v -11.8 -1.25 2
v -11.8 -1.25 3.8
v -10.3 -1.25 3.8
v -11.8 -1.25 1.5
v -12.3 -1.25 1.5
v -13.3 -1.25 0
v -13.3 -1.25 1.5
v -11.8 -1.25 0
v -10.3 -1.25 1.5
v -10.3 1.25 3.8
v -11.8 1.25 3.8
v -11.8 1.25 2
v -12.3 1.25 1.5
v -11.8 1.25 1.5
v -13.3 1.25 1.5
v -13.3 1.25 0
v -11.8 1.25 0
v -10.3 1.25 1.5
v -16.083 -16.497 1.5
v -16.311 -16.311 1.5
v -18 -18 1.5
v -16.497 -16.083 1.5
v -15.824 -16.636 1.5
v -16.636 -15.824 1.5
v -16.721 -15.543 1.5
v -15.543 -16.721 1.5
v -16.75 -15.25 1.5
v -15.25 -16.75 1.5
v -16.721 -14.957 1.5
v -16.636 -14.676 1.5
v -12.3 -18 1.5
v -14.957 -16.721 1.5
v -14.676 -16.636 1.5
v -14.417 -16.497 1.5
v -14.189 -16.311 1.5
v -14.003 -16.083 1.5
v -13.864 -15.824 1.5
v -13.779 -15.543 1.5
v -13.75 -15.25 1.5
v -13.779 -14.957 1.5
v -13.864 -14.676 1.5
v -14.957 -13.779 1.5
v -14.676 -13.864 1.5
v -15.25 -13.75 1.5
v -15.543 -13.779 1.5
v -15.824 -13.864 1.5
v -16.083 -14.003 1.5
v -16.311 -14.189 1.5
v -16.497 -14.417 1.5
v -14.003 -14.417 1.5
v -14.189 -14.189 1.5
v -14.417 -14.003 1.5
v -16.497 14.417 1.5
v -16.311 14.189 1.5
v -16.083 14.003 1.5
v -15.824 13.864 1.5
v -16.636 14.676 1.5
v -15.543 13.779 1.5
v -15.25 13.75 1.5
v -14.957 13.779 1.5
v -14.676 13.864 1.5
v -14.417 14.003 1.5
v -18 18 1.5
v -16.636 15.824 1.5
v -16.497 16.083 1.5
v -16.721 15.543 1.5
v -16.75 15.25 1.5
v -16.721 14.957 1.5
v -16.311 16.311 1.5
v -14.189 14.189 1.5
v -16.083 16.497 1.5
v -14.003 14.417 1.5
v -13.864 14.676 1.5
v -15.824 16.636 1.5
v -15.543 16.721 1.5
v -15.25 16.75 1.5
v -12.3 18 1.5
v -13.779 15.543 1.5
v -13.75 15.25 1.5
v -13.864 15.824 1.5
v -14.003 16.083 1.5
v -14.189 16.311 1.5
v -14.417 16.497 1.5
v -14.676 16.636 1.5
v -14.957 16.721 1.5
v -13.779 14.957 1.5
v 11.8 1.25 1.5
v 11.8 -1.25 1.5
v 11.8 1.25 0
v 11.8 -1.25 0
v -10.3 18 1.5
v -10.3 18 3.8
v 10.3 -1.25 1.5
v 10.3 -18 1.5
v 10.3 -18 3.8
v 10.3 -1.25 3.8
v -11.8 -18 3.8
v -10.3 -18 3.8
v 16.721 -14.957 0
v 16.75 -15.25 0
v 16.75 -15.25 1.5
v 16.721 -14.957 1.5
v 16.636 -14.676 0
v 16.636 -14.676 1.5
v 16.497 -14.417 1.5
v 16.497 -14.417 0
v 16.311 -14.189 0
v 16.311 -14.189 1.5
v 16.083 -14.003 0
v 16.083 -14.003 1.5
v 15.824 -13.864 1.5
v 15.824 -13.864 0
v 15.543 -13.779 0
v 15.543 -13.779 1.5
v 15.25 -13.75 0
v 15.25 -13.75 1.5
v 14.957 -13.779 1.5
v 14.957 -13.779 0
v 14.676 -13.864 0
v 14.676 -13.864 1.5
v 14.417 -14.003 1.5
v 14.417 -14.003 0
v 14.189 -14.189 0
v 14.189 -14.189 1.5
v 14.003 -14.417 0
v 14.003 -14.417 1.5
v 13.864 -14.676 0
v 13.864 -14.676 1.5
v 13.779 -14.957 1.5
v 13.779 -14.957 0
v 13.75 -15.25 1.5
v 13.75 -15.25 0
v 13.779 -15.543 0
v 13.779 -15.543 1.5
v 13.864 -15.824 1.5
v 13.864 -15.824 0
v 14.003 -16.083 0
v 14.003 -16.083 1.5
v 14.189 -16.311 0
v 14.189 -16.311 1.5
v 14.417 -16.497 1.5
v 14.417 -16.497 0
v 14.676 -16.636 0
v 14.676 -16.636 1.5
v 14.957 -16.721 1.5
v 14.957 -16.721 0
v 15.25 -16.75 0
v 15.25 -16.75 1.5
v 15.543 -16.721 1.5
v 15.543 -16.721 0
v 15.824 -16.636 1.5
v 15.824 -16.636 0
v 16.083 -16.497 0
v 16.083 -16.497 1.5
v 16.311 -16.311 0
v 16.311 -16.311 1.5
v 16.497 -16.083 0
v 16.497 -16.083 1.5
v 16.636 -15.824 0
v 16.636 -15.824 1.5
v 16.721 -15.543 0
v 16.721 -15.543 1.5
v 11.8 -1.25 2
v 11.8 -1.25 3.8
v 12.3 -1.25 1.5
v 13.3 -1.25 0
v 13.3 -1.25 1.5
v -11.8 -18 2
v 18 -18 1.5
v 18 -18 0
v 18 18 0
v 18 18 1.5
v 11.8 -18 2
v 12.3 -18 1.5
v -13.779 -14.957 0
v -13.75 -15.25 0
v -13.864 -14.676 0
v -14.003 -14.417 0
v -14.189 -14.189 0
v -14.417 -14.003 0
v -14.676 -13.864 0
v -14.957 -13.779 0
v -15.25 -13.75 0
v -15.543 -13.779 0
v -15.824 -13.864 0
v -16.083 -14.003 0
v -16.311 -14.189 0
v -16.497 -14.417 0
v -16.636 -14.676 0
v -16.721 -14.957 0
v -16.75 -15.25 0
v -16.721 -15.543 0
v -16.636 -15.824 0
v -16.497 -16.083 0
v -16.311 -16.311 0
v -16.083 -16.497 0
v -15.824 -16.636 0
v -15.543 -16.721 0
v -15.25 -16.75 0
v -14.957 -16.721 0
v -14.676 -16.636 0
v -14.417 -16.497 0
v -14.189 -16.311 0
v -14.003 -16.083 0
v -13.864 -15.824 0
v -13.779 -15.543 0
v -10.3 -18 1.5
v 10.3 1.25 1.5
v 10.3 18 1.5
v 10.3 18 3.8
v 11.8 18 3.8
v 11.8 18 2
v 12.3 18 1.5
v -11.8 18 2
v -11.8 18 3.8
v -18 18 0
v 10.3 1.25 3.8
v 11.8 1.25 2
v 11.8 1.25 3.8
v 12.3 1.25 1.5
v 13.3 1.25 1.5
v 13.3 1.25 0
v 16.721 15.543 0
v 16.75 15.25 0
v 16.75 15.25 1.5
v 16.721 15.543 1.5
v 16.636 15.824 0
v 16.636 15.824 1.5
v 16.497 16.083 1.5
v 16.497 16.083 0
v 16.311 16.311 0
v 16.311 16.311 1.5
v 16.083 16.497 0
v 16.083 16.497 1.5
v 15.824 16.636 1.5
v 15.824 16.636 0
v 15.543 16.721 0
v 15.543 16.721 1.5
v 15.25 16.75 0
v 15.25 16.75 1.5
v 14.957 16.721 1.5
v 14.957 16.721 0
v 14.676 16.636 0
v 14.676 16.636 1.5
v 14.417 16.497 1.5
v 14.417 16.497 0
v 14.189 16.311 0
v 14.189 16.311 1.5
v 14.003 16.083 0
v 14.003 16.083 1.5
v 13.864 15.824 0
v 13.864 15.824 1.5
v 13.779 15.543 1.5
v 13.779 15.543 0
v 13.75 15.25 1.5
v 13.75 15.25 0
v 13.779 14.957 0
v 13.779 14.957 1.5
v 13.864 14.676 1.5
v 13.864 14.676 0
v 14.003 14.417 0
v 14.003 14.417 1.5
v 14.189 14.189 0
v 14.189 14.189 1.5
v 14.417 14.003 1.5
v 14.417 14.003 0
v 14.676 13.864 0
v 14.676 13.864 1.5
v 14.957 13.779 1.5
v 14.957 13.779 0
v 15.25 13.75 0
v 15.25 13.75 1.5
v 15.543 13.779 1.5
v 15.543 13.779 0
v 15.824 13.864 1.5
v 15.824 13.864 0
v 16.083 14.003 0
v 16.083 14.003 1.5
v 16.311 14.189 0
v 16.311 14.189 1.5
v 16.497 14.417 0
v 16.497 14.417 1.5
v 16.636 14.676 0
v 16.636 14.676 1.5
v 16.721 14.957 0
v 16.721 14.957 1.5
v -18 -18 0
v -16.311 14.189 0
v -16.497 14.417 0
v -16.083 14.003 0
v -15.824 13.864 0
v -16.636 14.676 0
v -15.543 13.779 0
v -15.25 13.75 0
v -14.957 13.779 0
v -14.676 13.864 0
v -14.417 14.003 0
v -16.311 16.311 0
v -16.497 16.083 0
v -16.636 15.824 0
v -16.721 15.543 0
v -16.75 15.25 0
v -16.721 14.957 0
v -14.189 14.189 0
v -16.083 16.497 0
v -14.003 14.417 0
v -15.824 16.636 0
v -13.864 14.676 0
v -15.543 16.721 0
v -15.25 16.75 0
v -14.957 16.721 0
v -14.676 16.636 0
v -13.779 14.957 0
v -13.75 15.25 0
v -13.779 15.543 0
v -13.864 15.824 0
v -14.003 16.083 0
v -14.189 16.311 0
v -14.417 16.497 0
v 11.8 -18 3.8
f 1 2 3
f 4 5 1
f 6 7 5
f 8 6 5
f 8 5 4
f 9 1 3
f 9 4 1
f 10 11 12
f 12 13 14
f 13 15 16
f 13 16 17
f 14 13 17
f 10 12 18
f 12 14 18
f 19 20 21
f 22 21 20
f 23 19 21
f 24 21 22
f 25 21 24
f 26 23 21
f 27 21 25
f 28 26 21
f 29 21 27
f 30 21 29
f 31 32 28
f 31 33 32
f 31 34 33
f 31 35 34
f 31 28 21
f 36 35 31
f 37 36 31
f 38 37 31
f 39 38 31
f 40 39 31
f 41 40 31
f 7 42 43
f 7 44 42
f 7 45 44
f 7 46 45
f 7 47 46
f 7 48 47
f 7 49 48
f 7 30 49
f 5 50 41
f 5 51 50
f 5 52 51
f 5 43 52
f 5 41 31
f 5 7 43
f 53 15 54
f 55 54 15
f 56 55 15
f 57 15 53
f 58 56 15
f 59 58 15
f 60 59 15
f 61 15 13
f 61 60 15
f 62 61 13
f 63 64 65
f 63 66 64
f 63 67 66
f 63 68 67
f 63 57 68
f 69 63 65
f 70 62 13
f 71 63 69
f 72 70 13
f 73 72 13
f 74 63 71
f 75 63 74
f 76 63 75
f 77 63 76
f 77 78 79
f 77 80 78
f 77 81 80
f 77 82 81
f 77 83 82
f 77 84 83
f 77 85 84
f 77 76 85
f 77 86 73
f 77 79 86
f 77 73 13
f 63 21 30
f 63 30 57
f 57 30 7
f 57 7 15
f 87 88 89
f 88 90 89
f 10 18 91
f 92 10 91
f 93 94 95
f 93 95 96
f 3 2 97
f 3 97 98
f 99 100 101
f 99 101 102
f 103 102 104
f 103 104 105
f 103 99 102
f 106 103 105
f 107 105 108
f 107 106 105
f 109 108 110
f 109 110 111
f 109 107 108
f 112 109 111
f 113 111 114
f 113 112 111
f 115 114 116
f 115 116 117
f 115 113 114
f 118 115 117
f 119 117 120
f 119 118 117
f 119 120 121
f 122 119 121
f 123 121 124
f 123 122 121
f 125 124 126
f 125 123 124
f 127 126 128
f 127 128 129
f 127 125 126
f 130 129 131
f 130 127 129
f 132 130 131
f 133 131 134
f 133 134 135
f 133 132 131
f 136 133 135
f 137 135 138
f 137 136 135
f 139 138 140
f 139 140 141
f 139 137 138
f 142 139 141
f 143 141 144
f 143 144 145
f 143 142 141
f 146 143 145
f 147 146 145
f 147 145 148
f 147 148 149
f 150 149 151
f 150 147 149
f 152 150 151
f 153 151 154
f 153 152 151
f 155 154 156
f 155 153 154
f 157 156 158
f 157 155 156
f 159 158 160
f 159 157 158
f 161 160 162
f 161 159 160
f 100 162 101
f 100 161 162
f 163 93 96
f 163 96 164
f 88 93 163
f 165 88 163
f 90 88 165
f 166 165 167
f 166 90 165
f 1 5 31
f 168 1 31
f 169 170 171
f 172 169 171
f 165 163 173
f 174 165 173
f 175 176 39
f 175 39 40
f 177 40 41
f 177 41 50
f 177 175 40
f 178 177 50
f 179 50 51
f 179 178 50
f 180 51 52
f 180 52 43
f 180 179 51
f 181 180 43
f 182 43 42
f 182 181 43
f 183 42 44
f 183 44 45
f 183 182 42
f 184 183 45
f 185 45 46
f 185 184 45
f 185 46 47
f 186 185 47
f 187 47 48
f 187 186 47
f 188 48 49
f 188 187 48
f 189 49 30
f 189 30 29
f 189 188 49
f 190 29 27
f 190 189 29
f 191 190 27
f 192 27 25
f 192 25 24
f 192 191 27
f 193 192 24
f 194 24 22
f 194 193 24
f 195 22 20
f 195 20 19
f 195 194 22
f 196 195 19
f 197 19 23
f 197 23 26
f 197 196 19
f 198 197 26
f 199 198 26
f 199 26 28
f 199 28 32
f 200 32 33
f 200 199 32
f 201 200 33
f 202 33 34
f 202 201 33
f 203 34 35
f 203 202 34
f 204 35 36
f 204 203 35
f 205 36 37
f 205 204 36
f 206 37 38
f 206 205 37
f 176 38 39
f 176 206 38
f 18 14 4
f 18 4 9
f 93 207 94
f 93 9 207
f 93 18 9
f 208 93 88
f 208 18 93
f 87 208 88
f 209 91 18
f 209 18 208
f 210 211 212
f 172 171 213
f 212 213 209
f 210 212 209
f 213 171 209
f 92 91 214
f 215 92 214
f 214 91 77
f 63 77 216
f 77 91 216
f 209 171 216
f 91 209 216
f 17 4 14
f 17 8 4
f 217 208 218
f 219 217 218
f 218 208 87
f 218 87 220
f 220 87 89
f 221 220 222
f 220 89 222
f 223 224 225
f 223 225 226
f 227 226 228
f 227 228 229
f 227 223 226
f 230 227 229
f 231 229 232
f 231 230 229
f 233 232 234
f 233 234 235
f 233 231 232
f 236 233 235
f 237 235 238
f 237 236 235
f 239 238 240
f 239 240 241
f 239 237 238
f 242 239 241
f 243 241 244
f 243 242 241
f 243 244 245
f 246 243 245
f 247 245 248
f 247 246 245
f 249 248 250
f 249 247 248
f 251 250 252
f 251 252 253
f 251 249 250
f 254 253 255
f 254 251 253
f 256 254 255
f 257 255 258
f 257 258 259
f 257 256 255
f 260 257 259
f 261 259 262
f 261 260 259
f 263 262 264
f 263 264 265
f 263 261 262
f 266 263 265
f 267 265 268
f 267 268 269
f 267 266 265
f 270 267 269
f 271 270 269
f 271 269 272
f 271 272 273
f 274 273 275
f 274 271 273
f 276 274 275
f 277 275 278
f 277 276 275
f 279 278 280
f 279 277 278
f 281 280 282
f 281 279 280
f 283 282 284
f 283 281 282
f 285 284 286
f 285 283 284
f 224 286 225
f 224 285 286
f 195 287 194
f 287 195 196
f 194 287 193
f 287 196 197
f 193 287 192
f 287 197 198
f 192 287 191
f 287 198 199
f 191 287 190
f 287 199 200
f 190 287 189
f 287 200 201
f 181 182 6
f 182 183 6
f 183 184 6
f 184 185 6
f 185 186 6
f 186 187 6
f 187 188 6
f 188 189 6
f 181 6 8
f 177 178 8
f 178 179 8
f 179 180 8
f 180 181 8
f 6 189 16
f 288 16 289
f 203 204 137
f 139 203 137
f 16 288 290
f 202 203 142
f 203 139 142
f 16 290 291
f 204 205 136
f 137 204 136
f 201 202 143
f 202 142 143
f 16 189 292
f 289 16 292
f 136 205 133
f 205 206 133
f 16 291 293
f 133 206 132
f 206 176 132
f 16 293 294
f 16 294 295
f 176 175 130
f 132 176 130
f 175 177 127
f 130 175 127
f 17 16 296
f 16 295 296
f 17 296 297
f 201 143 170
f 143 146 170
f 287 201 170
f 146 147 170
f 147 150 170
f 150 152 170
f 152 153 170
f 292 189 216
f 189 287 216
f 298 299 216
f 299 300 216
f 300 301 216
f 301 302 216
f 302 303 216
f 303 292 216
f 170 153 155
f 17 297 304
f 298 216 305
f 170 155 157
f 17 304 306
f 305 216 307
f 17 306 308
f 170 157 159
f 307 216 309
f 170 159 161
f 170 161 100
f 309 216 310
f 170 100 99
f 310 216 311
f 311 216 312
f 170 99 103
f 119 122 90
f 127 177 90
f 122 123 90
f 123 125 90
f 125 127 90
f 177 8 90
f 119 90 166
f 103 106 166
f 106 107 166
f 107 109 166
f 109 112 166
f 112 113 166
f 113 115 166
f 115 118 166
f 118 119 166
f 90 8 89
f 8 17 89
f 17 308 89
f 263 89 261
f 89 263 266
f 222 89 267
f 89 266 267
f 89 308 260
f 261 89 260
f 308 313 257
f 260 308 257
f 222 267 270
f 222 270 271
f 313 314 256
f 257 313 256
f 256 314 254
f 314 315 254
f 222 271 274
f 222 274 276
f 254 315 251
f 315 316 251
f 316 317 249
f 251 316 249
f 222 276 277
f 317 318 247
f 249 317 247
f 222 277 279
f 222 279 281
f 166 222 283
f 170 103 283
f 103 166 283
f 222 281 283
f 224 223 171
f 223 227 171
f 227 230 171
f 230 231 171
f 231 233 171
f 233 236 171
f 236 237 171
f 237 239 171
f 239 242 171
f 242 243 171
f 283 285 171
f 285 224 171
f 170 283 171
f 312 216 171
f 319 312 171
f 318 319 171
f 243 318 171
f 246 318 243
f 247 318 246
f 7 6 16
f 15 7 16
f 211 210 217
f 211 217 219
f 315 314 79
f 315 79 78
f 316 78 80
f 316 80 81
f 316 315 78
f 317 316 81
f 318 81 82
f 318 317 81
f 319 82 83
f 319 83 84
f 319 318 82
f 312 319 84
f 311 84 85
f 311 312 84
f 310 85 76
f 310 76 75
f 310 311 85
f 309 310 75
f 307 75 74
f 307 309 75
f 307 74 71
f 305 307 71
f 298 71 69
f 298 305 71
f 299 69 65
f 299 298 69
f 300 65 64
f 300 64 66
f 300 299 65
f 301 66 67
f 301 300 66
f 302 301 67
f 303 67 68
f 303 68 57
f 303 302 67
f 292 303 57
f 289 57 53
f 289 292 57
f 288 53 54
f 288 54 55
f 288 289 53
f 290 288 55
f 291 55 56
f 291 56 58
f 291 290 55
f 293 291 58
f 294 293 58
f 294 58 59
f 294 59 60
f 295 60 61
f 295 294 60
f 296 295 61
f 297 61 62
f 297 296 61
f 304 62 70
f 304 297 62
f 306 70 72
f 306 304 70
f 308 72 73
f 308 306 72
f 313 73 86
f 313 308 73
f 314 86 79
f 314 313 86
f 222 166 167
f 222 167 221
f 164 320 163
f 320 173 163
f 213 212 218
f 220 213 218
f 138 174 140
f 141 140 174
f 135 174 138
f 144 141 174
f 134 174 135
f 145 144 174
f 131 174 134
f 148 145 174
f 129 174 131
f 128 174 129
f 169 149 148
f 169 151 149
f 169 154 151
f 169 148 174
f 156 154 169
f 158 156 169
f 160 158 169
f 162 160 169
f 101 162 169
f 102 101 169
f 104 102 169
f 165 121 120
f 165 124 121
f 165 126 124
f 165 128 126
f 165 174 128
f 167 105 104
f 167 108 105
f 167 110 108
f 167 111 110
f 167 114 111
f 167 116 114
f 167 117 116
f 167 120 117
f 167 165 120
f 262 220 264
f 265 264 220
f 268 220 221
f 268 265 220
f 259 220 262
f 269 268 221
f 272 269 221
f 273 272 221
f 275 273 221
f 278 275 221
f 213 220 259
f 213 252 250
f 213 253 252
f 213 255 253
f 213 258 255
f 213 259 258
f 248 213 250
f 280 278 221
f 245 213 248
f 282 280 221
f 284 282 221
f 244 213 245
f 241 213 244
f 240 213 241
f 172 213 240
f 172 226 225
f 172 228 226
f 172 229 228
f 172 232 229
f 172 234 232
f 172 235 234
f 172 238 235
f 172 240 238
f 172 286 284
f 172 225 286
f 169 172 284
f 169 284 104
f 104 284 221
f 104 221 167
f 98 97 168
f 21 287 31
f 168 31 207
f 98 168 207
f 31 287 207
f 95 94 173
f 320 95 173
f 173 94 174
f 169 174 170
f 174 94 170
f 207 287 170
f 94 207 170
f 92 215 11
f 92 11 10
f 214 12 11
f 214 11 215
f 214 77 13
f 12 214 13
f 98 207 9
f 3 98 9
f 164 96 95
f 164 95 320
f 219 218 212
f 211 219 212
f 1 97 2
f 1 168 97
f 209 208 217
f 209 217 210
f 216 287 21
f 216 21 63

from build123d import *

# Parameters (mm, degrees)
F0_W     = 6.2
F0_H     = 36
F0_R     = 1.5
F0_W_2   = 1.5
F0_W_3   = 20.6
F3_DEPTH = 1.5
F4_DEPTH = 3.8
F2_W     = 1.5
F2_H     = 2.5
F5_DEPTH = 25
F6_SIZE  = 0.5
F7_W     = 1.5
F7_H     = 2.5
F8_DEPTH = 25


with BuildPart() as f3:
    # F0 (on Top) → F3 (new body)
    with BuildSketch(Plane.XY):
        with Locations((14.9, 0)):
            Rectangle(F0_W, F0_H)
        with Locations((15.25, -15.25)):
            Circle(F0_R, mode=Mode.SUBTRACT)
        with Locations((15.25, 15.25)):
            Circle(F0_R, mode=Mode.SUBTRACT)
        with Locations((11.05, 0)):
            Rectangle(F0_W_2, F0_H)
        Rectangle(F0_W_3, F0_H)
        with Locations((-11.05, 0)):
            Rectangle(F0_W_2, F0_H)
        with Locations((-14.9, 0)):
            Rectangle(F0_W, F0_H)
        with Locations((-15.25, -15.25)):
            Circle(F0_R, mode=Mode.SUBTRACT)
        with Locations((-15.25, 15.25)):
            Circle(F0_R, mode=Mode.SUBTRACT)
    extrude(amount=F3_DEPTH)

    # F0 (on Top) → F4 (join)
    with BuildSketch(Plane.XY):
        with Locations((-11.05, 0)):
            Rectangle(F0_W_2, F0_H)
        with Locations((11.05, 0)):
            Rectangle(F0_W_2, F0_H)
    extrude(amount=F4_DEPTH)

    # F2 (on face) → F5 (cut)
    with BuildSketch(Plane.XY):
        with Locations((-12.55, 0)):
            Rectangle(F2_W, F2_H)
        with Locations((12.55, 0)):
            Rectangle(F2_W, F2_H)
    extrude(amount=F5_DEPTH, mode=Mode.SUBTRACT)

    # F6
    f6_edges = [f3.edges().sort_by_distance(p)[0] for p in [
        (-11.8, 9.625, 1.5),
        (-11.8, -9.625, 1.5),
        (11.8, -9.625, 1.5),
        (11.8, 9.625, 1.5),
    ]]
    chamfer(f6_edges, length=F6_SIZE)

    # F7 (on face) → F8 (cut)
    with BuildSketch(Plane.XY.offset(1.5)):
        with Locations((-11.05, 0)):
            Rectangle(F7_W, F7_H)
        with Locations((11.05, 0)):
            Rectangle(F7_W, F7_H)
    extrude(amount=F8_DEPTH, mode=Mode.SUBTRACT)


solid = f3.part
